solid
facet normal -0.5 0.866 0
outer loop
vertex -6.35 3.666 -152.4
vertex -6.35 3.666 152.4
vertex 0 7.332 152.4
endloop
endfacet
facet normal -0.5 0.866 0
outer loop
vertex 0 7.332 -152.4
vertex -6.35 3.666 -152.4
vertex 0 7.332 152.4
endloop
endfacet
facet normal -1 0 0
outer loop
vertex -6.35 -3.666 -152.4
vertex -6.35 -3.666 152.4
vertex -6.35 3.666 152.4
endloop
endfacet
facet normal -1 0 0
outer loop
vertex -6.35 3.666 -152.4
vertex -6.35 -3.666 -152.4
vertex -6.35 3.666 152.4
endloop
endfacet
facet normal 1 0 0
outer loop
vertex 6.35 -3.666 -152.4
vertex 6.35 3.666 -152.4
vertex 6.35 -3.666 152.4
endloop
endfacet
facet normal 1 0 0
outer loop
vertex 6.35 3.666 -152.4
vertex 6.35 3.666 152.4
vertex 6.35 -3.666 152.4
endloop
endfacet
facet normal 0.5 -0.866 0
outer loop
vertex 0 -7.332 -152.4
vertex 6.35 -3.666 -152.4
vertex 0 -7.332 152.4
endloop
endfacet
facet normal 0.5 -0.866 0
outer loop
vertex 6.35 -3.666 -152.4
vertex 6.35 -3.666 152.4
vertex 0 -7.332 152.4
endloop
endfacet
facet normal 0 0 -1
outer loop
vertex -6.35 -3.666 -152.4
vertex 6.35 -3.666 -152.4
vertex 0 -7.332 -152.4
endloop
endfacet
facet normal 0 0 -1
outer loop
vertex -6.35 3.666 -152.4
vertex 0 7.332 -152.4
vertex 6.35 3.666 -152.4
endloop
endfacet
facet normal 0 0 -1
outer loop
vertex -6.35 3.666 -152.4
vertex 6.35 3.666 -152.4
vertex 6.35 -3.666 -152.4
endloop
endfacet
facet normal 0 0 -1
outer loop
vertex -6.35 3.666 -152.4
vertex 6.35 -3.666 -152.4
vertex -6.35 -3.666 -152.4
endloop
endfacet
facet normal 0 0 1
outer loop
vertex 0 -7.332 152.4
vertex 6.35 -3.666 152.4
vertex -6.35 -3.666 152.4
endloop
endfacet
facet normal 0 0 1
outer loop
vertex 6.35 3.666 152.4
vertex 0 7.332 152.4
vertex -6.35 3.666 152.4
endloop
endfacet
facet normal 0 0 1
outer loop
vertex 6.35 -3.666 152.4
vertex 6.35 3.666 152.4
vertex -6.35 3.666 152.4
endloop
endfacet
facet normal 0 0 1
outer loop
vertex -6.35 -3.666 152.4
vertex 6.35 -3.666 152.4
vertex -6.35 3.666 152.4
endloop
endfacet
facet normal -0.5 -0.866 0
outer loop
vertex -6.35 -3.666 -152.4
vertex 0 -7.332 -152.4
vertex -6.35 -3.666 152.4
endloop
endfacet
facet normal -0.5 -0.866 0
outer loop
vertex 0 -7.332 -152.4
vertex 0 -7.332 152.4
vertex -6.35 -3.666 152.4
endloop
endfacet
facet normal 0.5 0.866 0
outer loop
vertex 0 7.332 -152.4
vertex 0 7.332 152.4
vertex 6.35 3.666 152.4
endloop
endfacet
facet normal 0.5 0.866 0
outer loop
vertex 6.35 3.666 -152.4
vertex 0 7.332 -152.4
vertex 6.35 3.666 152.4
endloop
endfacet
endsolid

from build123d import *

# Parameters (mm, degrees)
BOSS_EXTRUDE1_DEPTH = 152.4


with BuildPart() as part:
    # Sketch3 → Boss-Extrude1 (new, symmetric)
    with BuildSketch(Plane.XY):
        Polygon((0, 7.332348419), (6.35, 3.666174209), (6.35, -3.666174209), (0, -7.332348419), (-6.35, -3.666174209), (-6.35, 3.666174209), align=None)
    extrude(amount=BOSS_EXTRUDE1_DEPTH, both=True)


solid = part.part
